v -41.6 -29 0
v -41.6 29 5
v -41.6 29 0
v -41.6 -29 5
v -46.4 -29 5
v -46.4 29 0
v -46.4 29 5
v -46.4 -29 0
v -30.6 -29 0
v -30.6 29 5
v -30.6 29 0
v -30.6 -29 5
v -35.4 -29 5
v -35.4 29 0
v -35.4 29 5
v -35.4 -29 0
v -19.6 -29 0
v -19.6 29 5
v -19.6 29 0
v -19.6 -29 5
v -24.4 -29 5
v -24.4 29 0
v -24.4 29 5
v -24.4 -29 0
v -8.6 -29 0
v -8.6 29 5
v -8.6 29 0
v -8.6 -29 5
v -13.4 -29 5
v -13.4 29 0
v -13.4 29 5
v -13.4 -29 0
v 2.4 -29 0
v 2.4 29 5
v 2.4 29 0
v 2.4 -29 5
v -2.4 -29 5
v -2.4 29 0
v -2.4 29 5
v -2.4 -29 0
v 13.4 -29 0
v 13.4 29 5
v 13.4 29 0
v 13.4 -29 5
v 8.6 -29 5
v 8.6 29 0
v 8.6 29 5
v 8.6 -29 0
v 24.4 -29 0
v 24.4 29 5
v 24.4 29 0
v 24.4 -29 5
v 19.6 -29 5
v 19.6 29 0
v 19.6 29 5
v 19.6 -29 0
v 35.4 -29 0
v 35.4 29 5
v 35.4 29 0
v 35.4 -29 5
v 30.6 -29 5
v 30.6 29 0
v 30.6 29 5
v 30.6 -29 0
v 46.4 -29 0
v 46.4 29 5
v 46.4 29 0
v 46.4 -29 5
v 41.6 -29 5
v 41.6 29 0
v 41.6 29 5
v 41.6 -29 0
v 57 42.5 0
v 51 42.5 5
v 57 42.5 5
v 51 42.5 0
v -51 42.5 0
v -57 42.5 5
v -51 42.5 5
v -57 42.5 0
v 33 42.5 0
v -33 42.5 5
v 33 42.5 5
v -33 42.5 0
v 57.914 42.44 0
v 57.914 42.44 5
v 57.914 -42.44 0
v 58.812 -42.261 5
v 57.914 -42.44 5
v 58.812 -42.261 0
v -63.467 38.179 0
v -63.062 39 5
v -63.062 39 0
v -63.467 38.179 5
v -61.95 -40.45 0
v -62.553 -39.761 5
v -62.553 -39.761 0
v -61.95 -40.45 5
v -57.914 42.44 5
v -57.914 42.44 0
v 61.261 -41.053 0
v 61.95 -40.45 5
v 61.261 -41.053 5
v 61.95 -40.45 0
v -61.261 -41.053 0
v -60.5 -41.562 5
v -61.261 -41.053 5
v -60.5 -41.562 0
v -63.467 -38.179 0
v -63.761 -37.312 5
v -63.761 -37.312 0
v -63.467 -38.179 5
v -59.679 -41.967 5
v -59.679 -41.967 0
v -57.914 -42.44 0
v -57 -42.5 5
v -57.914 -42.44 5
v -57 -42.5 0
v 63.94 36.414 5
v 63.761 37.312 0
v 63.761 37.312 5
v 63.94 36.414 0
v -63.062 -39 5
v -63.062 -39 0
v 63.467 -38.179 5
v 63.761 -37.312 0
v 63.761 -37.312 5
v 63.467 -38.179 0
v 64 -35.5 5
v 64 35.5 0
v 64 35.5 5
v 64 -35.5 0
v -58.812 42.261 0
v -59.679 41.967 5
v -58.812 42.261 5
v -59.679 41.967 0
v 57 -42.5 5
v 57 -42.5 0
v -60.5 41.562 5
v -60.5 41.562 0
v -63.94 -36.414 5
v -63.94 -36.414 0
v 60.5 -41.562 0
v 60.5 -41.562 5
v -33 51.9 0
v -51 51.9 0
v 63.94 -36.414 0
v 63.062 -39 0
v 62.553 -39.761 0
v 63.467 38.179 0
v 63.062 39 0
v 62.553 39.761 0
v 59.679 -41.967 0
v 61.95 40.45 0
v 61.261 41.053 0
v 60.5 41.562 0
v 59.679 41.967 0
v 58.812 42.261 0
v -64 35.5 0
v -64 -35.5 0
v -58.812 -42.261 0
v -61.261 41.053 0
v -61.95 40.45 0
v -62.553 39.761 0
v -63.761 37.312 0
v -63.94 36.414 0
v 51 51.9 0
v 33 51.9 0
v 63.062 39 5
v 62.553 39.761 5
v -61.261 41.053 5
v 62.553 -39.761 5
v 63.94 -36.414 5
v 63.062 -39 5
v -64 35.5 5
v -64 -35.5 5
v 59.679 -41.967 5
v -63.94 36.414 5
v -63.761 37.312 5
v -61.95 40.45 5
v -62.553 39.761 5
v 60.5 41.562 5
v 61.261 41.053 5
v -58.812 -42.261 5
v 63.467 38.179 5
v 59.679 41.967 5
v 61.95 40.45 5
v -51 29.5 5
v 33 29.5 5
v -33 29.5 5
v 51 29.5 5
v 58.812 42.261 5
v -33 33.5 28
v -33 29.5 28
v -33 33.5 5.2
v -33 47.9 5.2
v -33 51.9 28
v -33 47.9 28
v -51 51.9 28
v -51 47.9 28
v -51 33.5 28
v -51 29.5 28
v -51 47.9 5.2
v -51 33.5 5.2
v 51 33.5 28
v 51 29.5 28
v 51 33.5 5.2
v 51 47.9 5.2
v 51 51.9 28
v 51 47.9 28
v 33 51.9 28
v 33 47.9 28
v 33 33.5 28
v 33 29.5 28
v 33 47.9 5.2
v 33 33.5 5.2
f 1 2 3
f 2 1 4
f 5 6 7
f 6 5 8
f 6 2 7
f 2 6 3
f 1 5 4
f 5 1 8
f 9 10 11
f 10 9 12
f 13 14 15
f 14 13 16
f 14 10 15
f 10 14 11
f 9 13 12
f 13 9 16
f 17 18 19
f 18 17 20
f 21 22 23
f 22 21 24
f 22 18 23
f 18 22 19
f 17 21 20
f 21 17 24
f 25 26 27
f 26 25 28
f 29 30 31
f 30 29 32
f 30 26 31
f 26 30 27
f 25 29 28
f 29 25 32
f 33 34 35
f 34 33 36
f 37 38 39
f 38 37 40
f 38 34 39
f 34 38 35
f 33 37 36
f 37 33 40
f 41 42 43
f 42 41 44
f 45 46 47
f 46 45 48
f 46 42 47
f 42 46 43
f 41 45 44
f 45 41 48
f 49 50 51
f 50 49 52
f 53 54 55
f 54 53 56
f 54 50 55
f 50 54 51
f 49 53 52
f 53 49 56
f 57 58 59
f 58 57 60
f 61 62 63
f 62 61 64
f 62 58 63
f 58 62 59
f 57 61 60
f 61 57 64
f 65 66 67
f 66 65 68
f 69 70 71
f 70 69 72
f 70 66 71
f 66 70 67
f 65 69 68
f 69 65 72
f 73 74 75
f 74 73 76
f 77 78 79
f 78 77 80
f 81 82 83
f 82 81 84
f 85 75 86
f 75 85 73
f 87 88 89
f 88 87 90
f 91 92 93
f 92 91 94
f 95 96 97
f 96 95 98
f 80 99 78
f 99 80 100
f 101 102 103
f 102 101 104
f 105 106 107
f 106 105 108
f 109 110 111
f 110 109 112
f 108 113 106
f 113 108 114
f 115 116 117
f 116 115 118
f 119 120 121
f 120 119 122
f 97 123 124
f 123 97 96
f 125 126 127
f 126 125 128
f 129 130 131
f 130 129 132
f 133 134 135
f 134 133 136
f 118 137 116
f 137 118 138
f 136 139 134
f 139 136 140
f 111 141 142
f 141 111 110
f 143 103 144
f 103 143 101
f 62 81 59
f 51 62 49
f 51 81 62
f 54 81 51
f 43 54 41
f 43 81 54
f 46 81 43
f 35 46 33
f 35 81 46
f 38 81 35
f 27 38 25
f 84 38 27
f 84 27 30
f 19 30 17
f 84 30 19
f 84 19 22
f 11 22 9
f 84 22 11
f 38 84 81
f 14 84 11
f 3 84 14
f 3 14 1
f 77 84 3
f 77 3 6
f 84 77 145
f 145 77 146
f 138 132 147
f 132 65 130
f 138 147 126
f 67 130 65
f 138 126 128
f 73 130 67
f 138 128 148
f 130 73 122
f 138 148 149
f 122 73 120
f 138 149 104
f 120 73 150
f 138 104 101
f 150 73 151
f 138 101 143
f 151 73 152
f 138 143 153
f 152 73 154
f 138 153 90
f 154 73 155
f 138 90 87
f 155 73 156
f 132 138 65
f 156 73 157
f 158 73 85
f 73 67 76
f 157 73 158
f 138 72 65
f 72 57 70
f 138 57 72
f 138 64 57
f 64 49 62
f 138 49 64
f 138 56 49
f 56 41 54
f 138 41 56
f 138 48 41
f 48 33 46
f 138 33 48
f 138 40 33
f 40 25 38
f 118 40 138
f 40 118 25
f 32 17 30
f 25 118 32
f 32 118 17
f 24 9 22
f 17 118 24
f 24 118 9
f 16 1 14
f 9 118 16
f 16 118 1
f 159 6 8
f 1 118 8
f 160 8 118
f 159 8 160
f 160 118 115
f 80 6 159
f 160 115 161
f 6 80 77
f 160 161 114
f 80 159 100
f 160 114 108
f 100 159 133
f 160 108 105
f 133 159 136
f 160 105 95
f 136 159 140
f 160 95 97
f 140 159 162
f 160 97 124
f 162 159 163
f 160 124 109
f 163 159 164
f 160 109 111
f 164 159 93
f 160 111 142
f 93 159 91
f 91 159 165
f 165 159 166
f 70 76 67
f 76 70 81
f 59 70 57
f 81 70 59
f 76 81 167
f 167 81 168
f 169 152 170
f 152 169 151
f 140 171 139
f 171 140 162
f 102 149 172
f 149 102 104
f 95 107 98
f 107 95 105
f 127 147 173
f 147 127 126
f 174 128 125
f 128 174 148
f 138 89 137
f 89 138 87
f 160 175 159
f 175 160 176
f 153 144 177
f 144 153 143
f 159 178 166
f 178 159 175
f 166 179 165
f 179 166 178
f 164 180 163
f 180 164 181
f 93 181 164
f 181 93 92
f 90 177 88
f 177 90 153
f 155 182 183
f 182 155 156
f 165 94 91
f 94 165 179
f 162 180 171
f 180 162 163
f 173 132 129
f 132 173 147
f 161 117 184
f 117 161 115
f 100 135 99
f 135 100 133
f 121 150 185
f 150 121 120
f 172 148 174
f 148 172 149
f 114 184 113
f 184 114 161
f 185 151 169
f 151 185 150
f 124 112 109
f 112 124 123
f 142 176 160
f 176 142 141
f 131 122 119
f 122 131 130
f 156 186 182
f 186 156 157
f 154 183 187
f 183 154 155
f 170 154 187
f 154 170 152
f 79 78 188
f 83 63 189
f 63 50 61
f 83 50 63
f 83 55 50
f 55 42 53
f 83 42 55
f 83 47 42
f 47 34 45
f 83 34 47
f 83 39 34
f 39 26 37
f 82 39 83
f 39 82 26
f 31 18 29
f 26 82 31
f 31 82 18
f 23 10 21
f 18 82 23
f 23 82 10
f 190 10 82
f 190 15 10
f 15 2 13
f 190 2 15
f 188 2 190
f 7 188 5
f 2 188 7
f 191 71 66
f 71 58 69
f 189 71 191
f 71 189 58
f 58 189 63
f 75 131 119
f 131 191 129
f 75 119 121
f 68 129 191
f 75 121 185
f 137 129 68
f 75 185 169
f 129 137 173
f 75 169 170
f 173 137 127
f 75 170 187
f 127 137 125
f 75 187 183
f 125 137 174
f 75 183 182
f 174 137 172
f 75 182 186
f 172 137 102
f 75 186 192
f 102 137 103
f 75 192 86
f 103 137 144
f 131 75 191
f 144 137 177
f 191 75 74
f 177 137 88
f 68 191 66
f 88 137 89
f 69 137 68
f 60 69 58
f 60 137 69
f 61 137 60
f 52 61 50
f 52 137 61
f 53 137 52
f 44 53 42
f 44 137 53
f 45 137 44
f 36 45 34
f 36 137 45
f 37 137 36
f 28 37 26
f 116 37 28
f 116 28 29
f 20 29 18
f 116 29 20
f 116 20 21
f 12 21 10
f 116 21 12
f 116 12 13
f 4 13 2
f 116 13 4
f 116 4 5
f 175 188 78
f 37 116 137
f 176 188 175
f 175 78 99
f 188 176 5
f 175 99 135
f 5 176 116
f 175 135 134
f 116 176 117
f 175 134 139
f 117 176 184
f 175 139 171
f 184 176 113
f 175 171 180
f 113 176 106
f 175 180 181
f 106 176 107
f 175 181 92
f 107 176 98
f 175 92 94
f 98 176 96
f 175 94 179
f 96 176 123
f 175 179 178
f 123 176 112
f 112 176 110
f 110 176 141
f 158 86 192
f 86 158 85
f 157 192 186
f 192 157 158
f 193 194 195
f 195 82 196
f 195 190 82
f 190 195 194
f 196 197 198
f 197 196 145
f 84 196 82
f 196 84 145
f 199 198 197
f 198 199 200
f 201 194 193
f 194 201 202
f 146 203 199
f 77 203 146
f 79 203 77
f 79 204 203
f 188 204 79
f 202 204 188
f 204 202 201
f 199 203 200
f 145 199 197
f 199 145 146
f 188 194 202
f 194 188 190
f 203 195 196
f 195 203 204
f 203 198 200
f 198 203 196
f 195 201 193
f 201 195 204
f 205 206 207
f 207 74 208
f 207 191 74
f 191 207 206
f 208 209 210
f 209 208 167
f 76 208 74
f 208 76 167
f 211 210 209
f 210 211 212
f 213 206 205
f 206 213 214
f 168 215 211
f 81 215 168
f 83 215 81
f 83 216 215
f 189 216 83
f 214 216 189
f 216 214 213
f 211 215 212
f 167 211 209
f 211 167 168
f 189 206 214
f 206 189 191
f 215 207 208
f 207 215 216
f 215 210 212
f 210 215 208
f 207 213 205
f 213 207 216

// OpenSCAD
// V1.4.2 · ORIGINAL dimensioned OpenSCAD print PROTOTYPE, units = mm, Z-up.
// Independent of the gallery's 180x60x130 mm visual mesh dimensions.
// Unverified: no physical clip fit, hygiene, UV, heat, wet durability or slicer sign-off.
// Author: 3D Worlds, MIT. Use a calibration coupon and measure the target lip.
$fn = 48;
mode = "body";              // "body" or "coupon"
tray_width_mm = 128;
tray_depth_mm = 85;
tray_thickness_mm = 5;
corner_radius_mm = 7;
drain_slot_width_mm = 4.8;
drain_slot_pitch_mm = 11;
drain_slot_length_mm = 58;
drain_slot_count = 9;
target_lip_thickness_mm = 14;  // USER MEASUREMENT REQUIRED
lip_clearance_mm = 0.4;        // uncalibrated total nominal gap allowance
clip_wall_mm = 4;
clip_width_mm = 18;
clip_height_mm = 28;
clip_extra_mm = 0.2;          // positive join allowance
assert(tray_thickness_mm >= 3.6, "tray base below design minimum");
assert(clip_wall_mm >= 3.2, "clip walls below design minimum");
assert(drain_slot_pitch_mm - drain_slot_width_mm >= 3.2,
       "drain slat too narrow");
assert(target_lip_thickness_mm > 3 && lip_clearance_mm >= 0,
       "invalid clip fit input");
assert(drain_slot_count >= 3 &&
       drain_slot_count * drain_slot_pitch_mm < tray_width_mm - 15,
       "slots consume rim");

module rounded_plate(w, d, h, r) {
  hull() {
    for (x = [-w / 2 + r, w / 2 - r])
      for (y = [-d / 2 + r, d / 2 - r])
        translate([x, y, 0]) cylinder(h = h, r = r);
  }
}

module draining_tray() {
  difference() {
    rounded_plate(tray_width_mm, tray_depth_mm,
                  tray_thickness_mm, corner_radius_mm);
    // The slots are true voids through the material, not dark thin overlays.
    for (i = [0 : drain_slot_count - 1]) {
      x = (i - (drain_slot_count - 1) / 2) * drain_slot_pitch_mm;
      translate([x - drain_slot_width_mm / 2,
                 -drain_slot_length_mm / 2, -1])
        cube([drain_slot_width_mm, drain_slot_length_mm,
              tray_thickness_mm + 2]);
    }
  }
}

module clip_at(x, extra_clearance = 0) {
  open_gap = target_lip_thickness_mm + lip_clearance_mm + extra_clearance;
  outside_depth = open_gap + 2 * clip_wall_mm;
  near_y = tray_depth_mm / 2 - 13;
  // Two printed uprights rise from the main tray.
  // The upward slot is OPEN: no hidden ceiling/support assumption.
  difference() {
    translate([x - clip_width_mm / 2, near_y, 0])
      cube([clip_width_mm, outside_depth, clip_height_mm]);
    translate([x - clip_width_mm / 2 - 1,
               near_y + clip_wall_mm,
               tray_thickness_mm + clip_extra_mm])
      cube([clip_width_mm + 2, open_gap,
            clip_height_mm - tray_thickness_mm + 2]);
  }
}

module body() {
  union() {
    draining_tray();
    for (x = [-42, 42]) clip_at(x);
  }
}

// Printed alongside the main design ONLY as a separately selected object.
// Three gap variants (0.2, 0.4, 0.6 mm extra) require real sink-lip fit tests.
module coupon() {
  for (i = [0:2]) {
    translate([i * 27 - 27, 0, 0])
    difference() {
      cube([20, target_lip_thickness_mm + lip_clearance_mm + 9, 12],
           center = true);
      translate([0, 0, 2])
        cube([22, target_lip_thickness_mm + lip_clearance_mm +
              i * 0.2, 11], center = true);
    }
  }
}
if (mode == "coupon") coupon(); else body();
